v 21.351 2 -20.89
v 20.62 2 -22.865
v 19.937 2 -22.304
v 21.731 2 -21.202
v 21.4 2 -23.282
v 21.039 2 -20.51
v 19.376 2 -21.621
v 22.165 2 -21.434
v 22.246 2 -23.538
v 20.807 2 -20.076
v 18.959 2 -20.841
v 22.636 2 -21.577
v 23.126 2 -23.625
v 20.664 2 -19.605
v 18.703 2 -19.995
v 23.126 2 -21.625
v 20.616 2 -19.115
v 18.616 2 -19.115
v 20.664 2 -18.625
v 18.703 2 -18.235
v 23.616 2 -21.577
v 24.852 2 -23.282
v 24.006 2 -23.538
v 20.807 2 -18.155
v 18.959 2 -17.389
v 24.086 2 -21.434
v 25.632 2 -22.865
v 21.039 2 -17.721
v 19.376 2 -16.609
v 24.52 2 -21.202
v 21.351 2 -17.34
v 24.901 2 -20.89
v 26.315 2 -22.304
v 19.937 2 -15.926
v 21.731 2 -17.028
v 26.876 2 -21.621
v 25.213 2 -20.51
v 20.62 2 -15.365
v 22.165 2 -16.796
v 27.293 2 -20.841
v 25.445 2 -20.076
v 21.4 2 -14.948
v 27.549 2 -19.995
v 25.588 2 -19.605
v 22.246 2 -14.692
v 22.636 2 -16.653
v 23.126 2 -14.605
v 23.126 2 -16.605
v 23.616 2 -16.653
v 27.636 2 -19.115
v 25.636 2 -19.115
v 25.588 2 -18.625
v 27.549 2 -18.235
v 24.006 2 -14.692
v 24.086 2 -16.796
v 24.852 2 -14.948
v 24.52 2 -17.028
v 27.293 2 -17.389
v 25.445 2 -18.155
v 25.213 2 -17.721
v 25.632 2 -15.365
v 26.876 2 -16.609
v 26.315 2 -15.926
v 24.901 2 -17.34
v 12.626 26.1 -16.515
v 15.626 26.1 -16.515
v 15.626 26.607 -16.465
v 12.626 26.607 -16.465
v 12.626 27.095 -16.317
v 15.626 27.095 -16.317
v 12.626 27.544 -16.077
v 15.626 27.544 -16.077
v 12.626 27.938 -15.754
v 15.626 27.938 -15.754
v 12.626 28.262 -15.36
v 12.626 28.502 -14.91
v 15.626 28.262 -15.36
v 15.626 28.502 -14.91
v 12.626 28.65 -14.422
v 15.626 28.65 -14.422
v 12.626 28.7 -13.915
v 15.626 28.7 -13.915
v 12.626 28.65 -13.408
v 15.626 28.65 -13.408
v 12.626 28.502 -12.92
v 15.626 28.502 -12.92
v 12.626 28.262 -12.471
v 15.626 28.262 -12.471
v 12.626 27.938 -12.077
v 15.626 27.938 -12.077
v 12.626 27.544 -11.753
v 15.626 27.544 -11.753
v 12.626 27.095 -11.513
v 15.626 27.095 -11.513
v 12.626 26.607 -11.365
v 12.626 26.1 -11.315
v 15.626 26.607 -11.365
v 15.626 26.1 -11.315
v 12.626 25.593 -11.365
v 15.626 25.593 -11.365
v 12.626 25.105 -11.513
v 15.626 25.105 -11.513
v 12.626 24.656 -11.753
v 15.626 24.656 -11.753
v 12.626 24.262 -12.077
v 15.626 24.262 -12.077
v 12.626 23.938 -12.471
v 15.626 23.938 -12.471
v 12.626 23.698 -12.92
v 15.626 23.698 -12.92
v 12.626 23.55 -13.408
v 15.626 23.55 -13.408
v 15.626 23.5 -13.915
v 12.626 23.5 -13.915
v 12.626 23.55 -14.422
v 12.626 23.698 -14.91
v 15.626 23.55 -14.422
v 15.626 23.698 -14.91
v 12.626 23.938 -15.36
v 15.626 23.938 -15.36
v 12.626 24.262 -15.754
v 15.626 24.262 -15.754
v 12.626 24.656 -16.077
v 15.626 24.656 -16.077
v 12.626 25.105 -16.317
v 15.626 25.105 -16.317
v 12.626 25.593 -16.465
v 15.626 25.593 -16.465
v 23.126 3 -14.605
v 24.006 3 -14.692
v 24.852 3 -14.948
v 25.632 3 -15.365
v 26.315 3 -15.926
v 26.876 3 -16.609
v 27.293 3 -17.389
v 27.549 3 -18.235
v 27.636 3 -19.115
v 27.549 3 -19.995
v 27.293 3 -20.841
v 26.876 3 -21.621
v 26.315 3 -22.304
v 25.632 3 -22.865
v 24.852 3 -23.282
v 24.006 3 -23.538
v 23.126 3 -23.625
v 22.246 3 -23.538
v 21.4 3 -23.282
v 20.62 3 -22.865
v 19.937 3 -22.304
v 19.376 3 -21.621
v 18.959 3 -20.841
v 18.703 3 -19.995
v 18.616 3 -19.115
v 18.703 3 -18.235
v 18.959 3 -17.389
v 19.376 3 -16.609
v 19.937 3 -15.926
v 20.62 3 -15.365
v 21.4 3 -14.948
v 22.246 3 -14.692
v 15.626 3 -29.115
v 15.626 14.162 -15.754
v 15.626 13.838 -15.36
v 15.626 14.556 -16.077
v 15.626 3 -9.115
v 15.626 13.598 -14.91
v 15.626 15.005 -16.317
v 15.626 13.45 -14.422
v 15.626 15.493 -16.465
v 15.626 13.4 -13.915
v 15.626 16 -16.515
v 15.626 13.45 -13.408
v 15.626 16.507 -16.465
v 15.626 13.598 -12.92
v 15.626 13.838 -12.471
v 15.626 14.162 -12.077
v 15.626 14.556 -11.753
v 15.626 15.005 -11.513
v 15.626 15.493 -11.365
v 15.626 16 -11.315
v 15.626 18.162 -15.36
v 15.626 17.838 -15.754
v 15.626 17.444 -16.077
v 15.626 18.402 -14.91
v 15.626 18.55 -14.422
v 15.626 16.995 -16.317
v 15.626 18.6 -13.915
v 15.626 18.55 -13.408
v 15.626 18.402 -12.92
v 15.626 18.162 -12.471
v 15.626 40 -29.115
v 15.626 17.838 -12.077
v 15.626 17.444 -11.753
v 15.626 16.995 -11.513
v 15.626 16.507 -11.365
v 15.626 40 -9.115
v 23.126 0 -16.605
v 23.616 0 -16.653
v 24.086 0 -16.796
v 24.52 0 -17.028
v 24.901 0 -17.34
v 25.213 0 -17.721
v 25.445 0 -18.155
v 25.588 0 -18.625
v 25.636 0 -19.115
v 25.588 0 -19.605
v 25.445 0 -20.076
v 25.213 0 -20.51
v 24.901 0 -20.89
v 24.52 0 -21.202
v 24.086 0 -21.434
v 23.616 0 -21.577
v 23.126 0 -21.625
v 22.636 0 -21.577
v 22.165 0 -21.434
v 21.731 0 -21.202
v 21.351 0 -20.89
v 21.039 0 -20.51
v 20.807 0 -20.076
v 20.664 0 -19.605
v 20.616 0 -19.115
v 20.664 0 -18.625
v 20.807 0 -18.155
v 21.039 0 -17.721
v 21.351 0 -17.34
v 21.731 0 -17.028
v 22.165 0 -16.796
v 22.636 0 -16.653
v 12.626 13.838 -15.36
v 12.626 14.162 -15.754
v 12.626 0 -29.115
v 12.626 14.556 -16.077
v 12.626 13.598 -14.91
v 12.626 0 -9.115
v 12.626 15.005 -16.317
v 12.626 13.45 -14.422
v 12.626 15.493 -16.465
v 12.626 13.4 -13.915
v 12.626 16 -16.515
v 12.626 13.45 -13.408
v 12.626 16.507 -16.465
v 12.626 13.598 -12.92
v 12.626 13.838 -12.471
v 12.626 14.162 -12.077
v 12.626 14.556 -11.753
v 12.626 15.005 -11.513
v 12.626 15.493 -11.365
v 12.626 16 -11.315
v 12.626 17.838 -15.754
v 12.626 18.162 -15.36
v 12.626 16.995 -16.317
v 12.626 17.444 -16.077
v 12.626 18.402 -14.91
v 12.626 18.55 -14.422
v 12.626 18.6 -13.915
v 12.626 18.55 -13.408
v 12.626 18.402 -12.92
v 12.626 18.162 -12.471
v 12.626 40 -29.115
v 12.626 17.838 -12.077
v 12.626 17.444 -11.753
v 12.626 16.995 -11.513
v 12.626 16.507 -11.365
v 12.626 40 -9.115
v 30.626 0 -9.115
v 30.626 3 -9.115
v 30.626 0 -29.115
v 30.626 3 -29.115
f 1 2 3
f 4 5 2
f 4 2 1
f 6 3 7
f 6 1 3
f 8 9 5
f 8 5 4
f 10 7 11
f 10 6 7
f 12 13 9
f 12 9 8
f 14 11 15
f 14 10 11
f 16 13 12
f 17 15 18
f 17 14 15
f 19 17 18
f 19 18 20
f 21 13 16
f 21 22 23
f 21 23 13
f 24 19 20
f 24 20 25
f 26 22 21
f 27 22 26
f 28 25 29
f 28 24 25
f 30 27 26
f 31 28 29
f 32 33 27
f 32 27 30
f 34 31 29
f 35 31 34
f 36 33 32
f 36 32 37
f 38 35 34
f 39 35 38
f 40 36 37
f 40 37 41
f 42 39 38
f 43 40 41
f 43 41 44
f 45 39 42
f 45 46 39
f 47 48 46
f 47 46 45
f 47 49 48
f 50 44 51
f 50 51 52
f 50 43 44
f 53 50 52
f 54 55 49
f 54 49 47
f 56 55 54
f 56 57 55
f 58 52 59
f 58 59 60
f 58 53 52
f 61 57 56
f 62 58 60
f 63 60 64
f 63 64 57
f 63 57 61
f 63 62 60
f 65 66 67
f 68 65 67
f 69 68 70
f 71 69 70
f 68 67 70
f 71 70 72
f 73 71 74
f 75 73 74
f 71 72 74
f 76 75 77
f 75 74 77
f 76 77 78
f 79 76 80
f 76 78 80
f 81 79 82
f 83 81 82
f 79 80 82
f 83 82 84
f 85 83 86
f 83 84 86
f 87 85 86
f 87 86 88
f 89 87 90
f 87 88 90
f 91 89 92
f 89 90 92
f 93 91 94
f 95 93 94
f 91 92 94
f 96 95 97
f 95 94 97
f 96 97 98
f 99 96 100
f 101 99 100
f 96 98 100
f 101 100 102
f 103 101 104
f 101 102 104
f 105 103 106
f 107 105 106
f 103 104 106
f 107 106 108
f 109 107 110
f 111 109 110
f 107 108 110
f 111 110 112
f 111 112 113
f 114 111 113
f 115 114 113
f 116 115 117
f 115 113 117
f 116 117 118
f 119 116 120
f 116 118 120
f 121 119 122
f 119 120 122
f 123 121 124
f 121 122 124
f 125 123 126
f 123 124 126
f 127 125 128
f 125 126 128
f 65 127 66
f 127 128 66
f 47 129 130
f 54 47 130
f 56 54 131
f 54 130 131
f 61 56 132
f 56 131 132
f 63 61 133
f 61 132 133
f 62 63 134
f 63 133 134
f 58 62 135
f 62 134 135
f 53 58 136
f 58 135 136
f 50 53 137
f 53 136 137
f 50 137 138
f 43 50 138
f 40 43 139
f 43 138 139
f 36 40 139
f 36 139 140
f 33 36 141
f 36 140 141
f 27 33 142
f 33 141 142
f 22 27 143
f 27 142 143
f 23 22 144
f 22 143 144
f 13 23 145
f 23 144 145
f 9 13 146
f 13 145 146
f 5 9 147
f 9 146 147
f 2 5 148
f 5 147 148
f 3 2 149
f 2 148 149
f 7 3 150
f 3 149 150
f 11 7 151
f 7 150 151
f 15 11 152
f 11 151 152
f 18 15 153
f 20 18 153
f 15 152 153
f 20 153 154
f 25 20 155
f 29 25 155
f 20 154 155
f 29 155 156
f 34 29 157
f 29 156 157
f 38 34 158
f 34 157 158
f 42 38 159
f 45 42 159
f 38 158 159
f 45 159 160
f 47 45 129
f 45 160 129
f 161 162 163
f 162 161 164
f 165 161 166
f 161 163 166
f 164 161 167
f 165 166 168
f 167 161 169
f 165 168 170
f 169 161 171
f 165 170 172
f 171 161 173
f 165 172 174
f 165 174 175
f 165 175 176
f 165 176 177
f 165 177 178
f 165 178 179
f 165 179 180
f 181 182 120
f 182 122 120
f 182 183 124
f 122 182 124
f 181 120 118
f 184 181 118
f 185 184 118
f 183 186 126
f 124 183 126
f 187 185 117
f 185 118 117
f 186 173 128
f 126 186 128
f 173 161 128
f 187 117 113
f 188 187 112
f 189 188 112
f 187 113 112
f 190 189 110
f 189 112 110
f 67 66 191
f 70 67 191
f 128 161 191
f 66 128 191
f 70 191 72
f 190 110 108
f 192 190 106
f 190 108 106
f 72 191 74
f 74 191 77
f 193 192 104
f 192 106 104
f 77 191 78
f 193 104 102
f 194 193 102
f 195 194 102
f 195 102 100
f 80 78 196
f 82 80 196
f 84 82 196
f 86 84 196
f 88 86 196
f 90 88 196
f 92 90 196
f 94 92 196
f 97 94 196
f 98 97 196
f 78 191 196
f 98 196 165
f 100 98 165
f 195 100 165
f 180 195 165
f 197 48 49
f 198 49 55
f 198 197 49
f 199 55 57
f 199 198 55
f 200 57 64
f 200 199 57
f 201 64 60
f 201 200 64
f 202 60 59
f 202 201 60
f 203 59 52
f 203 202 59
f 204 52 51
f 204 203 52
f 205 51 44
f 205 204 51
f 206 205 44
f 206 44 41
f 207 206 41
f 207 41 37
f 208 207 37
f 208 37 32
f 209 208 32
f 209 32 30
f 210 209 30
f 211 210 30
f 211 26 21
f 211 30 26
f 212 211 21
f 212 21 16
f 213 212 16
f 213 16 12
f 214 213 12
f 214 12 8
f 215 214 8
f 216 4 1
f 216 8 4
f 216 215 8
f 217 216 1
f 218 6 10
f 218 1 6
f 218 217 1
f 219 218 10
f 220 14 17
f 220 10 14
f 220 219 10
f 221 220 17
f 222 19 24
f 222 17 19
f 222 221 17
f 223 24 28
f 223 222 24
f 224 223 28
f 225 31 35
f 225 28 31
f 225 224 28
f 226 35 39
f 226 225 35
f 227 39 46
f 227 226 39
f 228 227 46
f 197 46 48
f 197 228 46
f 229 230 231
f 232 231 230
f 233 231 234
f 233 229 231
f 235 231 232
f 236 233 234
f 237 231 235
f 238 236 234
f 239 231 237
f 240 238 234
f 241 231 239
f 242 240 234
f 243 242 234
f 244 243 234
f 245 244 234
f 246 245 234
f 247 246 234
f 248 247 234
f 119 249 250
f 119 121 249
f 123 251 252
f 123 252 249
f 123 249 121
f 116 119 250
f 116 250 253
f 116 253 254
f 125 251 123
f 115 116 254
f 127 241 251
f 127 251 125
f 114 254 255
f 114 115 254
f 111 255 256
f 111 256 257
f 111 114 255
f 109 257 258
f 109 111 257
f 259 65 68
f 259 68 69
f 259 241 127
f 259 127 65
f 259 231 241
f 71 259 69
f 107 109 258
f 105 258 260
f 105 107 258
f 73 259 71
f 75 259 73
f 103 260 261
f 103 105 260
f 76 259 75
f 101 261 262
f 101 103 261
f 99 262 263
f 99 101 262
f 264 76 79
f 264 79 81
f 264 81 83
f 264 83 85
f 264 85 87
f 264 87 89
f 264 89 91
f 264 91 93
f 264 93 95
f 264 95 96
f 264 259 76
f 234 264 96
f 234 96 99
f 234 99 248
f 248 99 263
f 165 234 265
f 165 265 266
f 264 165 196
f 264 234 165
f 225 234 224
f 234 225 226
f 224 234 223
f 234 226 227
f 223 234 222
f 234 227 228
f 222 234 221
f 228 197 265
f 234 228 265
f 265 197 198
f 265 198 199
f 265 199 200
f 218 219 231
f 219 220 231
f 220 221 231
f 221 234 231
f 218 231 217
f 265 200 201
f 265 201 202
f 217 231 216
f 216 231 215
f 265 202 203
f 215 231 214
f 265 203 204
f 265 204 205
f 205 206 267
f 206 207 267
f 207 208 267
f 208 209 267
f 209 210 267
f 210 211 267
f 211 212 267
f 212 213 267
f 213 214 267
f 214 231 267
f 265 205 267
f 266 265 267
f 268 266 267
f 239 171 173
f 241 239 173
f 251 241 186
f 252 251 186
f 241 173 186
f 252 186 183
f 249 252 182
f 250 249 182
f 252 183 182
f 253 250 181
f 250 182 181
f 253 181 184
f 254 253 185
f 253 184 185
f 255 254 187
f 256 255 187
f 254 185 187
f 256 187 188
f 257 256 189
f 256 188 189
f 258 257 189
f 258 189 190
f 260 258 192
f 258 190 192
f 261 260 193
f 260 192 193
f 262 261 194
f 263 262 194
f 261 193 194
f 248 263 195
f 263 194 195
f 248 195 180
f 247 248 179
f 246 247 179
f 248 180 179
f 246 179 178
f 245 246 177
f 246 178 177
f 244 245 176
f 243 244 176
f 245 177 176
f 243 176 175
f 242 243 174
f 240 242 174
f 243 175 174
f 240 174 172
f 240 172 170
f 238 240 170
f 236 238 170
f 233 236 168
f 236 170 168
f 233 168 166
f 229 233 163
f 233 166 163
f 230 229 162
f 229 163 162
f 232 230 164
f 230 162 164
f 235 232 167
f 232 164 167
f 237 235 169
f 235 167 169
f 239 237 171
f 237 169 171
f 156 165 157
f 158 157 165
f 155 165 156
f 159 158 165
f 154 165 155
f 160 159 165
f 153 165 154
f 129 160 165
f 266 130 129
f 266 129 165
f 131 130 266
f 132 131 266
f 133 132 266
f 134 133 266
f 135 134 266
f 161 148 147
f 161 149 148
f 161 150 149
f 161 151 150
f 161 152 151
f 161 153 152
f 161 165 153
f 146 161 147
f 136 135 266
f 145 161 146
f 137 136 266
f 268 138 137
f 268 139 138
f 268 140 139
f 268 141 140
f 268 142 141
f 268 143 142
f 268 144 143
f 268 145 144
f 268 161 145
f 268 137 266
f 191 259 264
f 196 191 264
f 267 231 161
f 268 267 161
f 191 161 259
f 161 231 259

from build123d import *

# Parameters (mm, degrees)
SKETCH1_W                = 15
SKETCH1_H                = 20
SKETCH1_R                = 2.51
BOSS_EXTRUDE1_DEPTH      = 3
SKETCH2_R                = 4.51
CUT_EXTRUDE1_DEPTH       = 1
BOSS_EXTRUDE2_DEPTH      = 22
BOSS_EXTRUDE2_DEPTH_BACK = 3
SKETCH3_W                = 3
SKETCH3_H                = 20
SKETCH4_R                = 2.6
CUT_EXTRUDE2_DEPTH       = 22
BOSS_EXTRUDE3_START      = -3
SKETCH5_R                = 2.6
BOSS_EXTRUDE3_DEPTH      = 3
CUT_EXTRUDE3_DEPTH       = 5
SKETCH7_W                = 20
SKETCH7_H                = 20
BOSS_EXTRUDE4_DEPTH      = 3
SKETCH8_R                = 2.6
CUT_EXTRUDE6_DEPTH       = 3


with BuildPart() as part:
    # Sketch1 → Boss-Extrude1 (new body)
    with BuildSketch(Plane(origin=(0, 0, 0), x_dir=(1, 0, 0), z_dir=(0, 1, 0))):
        with Locations((23.125880705, 19.115097078)):
            Rectangle(SKETCH1_W, SKETCH1_H)
        with Locations((23.125880705, 19.115097078)):
            Circle(SKETCH1_R, mode=Mode.SUBTRACT)
    extrude(amount=BOSS_EXTRUDE1_DEPTH)

    # Sketch2 → Cut-Extrude1 (cut)
    with BuildSketch(Plane(origin=(0, 3, 0), x_dir=(1, 0, 0), z_dir=(0, 1, 0))):
        with Locations((23.125880705, 19.115097078)):
            Circle(SKETCH2_R)
    extrude(amount=-CUT_EXTRUDE1_DEPTH, mode=Mode.SUBTRACT)

    # Sketch3 → Boss-Extrude2 (add, two sides: drawn at the far end of the back side and taken through both)
    with BuildSketch(Plane(origin=(0, 3, 0), x_dir=(1, 0, 0), z_dir=(0, 1, 0)).offset(-BOSS_EXTRUDE2_DEPTH_BACK)):
        with Locations((14.125880705, 19.115097078)):
            Rectangle(SKETCH3_W, SKETCH3_H)
    extrude(amount=BOSS_EXTRUDE2_DEPTH + BOSS_EXTRUDE2_DEPTH_BACK)

    # Sketch4 → Cut-Extrude2 (cut)
    with BuildSketch(Plane.ZY.offset(-12.625880705)):
        with Locations((-23.115097078, 19)):
            Circle(SKETCH4_R)
        with Locations((-23.115097078, 6)):
            Circle(SKETCH4_R)
    extrude(amount=-CUT_EXTRUDE2_DEPTH, mode=Mode.SUBTRACT)

    # Sketch5 → Boss-Extrude3 (add)
    with BuildSketch(Plane(origin=(15.625880705, 0, 0), x_dir=(0, 0, -1), z_dir=(1, 0, 0)).offset(BOSS_EXTRUDE3_START)):
        with Locations((23.115097078, 19)):
            Circle(SKETCH5_R)
        with Locations((23.115097078, 6)):
            Circle(SKETCH5_R)
    extrude(amount=BOSS_EXTRUDE3_DEPTH)

    # Sketch6 → Cut-Extrude3 (cut)
    with BuildSketch(Plane(origin=(12.625880705, 25, -29.115097078), x_dir=(1, 0, 0), z_dir=(0, 1, 0))):
        Polygon((0, -14.855128206), (0, -20), (3, -20), (3, -14.855128206), (3, 0), (0, 0), align=None)
    extrude(amount=-CUT_EXTRUDE3_DEPTH, mode=Mode.SUBTRACT)

    # Sketch7 → Boss-Extrude4 (add)
    with BuildSketch(Plane.ZY.offset(-12.625880705)):
        with Locations((-19.115097078, 30)):
            Rectangle(SKETCH7_W, SKETCH7_H)
    extrude(amount=-BOSS_EXTRUDE4_DEPTH)

    # Sketch8 → Cut-Extrude6 (cut)
    with BuildSketch(Plane(origin=(15.625880705, 0, 0), x_dir=(0, 0, -1), z_dir=(1, 0, 0))):
        with Locations((13.915097078, 16)):
            Circle(SKETCH8_R)
        with Locations((13.915097078, 26.1)):
            Circle(SKETCH8_R)
    extrude(amount=-CUT_EXTRUDE6_DEPTH, mode=Mode.SUBTRACT)


solid = part.part
